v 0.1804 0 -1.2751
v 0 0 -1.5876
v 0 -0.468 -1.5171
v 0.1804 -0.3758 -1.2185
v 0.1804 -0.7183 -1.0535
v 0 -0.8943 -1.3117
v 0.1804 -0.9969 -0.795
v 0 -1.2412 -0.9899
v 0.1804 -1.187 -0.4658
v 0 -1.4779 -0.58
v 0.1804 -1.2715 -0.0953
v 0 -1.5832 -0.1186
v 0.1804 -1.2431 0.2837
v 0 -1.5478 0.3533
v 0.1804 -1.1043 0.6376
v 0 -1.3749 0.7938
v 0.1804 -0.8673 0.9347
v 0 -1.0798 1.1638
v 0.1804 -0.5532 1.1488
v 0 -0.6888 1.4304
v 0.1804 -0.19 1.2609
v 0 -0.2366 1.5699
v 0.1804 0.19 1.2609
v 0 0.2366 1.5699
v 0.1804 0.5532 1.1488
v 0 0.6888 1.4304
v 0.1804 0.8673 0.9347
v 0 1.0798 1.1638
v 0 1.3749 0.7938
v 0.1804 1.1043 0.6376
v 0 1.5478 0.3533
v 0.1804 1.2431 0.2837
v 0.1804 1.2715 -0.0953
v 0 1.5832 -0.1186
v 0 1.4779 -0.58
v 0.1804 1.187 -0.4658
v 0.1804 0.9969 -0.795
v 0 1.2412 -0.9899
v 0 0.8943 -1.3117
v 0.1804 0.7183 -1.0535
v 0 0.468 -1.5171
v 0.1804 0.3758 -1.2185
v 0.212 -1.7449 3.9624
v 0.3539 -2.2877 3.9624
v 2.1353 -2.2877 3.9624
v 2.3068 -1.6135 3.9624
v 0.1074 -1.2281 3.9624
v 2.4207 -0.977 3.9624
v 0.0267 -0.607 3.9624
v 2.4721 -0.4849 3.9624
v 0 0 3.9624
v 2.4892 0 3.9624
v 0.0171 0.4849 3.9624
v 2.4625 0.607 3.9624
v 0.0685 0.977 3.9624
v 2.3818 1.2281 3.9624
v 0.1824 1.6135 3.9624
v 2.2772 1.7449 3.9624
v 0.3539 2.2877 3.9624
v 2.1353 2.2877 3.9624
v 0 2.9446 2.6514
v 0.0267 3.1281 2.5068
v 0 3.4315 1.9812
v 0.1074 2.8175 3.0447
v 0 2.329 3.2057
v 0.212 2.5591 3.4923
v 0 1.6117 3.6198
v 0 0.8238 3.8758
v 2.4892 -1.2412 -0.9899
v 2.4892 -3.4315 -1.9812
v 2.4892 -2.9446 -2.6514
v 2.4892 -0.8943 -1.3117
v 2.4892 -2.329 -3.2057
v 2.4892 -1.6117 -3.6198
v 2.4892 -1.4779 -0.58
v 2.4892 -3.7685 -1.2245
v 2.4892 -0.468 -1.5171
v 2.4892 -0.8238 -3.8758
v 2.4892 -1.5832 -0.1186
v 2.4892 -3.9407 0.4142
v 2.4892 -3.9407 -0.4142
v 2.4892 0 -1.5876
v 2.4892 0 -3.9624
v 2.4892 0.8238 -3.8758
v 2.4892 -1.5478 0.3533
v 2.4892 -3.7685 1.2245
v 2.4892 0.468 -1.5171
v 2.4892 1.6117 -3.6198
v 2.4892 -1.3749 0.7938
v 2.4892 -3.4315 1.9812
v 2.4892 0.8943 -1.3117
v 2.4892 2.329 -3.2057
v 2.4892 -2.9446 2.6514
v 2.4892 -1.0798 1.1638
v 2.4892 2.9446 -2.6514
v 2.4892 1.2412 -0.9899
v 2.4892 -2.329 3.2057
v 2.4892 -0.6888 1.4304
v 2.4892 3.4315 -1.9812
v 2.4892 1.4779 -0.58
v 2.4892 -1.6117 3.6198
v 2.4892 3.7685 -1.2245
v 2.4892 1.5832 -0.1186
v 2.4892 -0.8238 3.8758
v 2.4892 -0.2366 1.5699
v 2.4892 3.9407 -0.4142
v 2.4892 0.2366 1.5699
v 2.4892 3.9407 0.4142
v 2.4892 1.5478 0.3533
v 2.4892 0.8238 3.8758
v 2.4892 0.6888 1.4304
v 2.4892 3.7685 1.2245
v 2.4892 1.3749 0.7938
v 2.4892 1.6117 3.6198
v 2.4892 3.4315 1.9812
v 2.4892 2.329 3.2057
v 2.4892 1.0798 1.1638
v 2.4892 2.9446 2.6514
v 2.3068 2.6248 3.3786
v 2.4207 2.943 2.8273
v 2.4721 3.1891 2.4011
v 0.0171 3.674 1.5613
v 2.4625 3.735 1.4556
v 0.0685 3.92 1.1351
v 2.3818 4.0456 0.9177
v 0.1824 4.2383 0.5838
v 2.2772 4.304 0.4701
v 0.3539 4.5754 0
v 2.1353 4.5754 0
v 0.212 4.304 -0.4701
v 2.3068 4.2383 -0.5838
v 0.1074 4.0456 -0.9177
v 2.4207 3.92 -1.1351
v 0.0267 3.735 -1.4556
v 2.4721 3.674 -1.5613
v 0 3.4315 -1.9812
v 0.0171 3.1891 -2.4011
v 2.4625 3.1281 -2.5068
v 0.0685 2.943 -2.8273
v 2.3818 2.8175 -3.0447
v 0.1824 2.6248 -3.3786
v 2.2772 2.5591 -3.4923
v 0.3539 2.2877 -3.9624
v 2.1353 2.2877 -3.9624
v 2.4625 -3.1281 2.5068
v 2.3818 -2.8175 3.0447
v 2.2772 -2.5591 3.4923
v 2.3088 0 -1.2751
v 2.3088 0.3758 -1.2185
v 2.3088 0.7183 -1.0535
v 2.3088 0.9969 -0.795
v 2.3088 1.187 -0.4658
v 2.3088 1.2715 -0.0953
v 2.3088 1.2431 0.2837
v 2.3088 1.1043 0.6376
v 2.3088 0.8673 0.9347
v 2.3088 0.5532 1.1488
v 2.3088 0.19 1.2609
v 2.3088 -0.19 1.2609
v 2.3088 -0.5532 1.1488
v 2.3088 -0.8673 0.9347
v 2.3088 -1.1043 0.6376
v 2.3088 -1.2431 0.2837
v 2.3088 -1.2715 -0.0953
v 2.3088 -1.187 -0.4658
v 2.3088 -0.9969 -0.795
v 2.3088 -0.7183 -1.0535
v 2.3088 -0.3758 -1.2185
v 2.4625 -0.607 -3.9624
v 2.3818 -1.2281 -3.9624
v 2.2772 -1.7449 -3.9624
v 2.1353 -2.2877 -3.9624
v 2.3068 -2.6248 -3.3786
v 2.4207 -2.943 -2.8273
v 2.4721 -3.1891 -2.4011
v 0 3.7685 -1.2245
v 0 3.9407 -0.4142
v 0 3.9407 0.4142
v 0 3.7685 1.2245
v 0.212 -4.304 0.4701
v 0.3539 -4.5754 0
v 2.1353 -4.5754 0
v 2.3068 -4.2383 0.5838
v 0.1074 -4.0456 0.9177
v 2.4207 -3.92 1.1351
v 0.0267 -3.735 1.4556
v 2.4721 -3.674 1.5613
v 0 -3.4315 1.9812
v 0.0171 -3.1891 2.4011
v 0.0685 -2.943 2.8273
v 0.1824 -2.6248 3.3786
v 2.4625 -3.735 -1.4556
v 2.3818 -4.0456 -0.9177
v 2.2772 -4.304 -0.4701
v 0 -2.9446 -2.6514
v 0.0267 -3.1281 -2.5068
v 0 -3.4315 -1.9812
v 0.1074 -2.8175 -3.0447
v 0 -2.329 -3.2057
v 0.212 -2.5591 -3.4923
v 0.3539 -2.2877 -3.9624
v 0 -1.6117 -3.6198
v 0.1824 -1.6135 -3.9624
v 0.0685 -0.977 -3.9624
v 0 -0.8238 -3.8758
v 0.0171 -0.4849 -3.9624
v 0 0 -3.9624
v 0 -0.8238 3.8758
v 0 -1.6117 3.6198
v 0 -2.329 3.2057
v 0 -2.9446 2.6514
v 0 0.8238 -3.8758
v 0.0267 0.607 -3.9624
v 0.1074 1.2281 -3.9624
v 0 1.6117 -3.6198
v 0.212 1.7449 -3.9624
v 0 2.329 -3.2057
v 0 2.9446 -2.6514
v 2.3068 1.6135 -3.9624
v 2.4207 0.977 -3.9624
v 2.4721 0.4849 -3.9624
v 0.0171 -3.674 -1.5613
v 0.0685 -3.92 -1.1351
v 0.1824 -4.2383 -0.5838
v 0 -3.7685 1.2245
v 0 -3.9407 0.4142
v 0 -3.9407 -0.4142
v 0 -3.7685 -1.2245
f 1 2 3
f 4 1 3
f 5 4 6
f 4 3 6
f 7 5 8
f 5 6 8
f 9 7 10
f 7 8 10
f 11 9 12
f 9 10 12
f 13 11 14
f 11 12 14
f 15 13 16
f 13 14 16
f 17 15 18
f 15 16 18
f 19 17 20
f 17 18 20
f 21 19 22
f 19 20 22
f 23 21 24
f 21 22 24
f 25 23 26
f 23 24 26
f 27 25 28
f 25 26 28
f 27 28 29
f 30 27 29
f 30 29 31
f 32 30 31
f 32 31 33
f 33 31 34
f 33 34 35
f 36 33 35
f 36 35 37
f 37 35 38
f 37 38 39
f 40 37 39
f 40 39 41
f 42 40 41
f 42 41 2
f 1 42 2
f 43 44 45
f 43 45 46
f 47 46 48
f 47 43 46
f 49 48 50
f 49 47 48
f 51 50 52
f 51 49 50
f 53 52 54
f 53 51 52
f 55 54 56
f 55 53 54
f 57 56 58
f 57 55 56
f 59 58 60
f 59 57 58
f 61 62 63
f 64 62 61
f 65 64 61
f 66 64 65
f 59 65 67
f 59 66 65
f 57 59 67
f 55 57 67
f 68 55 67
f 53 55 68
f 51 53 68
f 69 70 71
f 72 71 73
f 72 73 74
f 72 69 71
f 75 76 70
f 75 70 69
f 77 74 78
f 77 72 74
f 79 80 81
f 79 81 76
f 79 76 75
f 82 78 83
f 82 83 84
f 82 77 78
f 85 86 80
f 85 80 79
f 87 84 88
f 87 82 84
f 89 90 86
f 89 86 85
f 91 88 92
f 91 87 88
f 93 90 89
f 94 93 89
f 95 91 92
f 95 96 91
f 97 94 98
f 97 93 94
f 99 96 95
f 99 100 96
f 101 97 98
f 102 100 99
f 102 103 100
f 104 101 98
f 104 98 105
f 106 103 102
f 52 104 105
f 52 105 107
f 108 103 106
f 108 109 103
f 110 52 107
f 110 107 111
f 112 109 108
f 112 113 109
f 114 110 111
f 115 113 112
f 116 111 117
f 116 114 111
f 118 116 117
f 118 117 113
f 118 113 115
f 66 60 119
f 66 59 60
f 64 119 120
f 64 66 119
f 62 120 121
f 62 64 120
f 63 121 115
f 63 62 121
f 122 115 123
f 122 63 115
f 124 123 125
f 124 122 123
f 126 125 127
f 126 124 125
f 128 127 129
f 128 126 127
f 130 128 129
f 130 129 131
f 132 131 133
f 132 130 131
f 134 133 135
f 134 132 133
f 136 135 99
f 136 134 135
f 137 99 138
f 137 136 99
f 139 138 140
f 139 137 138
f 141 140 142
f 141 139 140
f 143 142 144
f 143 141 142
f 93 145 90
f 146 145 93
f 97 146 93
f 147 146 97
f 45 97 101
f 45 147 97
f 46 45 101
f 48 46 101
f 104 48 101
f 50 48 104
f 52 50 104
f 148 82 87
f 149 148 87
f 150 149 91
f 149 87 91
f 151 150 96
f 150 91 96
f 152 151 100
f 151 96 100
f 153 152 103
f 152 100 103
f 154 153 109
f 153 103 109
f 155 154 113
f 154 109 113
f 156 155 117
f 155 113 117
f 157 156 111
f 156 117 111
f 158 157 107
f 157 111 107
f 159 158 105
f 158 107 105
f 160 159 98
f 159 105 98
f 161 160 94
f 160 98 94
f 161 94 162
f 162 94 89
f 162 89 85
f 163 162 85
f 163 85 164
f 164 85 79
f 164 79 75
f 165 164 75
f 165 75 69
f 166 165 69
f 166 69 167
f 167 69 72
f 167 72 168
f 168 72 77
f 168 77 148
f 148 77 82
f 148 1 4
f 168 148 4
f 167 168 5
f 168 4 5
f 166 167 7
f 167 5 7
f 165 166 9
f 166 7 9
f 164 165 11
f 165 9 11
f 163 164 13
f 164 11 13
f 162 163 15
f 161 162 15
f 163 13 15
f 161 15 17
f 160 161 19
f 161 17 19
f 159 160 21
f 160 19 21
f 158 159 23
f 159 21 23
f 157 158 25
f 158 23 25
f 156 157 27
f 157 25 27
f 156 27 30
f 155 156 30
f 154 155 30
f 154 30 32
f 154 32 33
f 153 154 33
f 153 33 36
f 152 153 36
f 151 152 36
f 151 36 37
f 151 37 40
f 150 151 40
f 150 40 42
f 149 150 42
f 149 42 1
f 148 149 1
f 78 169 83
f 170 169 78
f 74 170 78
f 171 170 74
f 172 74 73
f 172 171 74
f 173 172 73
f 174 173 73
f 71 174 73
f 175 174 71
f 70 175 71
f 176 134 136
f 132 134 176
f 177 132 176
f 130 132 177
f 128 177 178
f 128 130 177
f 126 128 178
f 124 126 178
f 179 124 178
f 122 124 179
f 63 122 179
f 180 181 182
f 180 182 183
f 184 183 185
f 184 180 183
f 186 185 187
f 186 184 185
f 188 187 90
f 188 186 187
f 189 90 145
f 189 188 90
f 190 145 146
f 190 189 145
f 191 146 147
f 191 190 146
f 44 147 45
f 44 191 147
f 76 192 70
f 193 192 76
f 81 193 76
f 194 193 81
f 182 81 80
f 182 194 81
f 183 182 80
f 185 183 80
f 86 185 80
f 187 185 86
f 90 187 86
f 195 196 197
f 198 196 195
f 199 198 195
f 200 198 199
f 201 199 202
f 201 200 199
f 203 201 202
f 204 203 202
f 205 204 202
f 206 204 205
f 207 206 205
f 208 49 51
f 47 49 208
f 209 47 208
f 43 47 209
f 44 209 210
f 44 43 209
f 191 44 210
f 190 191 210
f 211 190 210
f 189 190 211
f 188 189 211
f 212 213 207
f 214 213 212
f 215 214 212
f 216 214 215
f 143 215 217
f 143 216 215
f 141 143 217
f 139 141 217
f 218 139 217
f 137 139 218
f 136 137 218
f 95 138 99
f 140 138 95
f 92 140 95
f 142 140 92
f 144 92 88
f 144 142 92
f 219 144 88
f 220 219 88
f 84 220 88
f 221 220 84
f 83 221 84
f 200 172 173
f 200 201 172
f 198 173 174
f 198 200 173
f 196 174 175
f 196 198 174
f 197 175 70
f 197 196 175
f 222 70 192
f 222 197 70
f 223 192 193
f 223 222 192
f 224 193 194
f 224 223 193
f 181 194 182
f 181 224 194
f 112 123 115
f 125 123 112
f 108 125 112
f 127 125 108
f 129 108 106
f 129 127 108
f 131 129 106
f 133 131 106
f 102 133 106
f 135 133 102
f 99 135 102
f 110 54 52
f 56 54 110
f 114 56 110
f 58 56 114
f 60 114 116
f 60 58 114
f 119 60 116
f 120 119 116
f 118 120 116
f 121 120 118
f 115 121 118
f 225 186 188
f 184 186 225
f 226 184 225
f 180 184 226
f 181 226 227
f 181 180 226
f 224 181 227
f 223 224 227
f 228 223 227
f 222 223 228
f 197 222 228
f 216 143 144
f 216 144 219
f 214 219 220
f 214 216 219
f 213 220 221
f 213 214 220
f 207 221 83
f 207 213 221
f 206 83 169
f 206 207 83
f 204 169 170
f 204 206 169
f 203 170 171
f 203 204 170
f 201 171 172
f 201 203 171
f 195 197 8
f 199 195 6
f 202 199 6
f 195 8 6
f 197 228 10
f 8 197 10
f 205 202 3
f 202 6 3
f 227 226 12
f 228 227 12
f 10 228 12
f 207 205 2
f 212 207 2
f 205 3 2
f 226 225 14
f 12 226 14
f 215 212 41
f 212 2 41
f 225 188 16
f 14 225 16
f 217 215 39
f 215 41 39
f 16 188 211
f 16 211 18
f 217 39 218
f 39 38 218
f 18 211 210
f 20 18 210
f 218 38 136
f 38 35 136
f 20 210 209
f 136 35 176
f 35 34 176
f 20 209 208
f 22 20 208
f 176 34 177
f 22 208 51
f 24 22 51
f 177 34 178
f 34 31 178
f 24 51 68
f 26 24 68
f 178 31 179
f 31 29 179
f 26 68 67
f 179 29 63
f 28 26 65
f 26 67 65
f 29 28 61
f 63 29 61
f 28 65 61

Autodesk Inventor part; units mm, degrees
ref_plane "YZ Plane" through (0, 0, 0) normal (1, 0, 0) x (0, 1, 0)
ref_plane "XZ Plane" through (0, 0, 0) normal (0, 1, 0) x (-1, 0, 0)
sketch "Sketch1" plane through (0, 0, 0) normal (1, 0, 0) x (0, 1, 0)
  line L0 (-4.5754, 0) -> (-2.2877, 3.9624)
  line L1 (-2.2877, 3.9624) -> (2.2877, 3.9624)
  line L2 (2.2877, 3.9624) -> (4.5754, 0)
  line L3 (4.5754, 0) -> (2.2877, -3.9624)
  line L4 (2.2877, -3.9624) -> (-2.2877, -3.9624)
  line L5 (-2.2877, -3.9624) -> (-4.5754, 0)
  point P0 (0, 0)
  point P1 (0, 0)
  dimension "d0" = 9.1508
extrude "Body" add sketch "Sketch1" along normal blind 2.4892
sketch "Sketch2" plane through (0, 0, 0) normal (0, 0, 1) x (1, 0, 0)
  line L0 (0, 2.2877) -> (0, 4.5754) projected
  line L1 (0, 4.5754) -> (2.4892, 4.5754) projected
  line L2 (2.4892, 2.2877) -> (2.4892, 4.5754) projected
  line L3 (-0.4978, 0) -> (2.987, 0) projected
  line L4 (0.3539, 4.5754) -> (0, 3.9624)
  line L5 (2.1353, 4.5754) -> (2.4892, 3.9624)
  dimension "d3" = 30
  dimension "d4" = 30
  dimension "d5" = 7.9248
  dimension "d6" = 7.9248
revolve "Chamfer1" cut sketch "Sketch2" angle 360 about axis through (-10, 0, 0) along (1, 0, 0)
sketch "Sketch3" plane through (2.4892, 0, 0) normal (1, 0, 0) x (0, 0, -1)
  arc A0 (-1.9812, -3.4315) -> (1.9812, -3.4315) centre (0, 0) ccw projected
hole "Thread" at (2.4892, 0, 0) direction (-1, 0, 0) diameter 2.5502 end through all thread size "5-44 UNF" class "2B" standard "ANSI Unified Screw Threads"
chamfer "Chamfer2" distance 0.3125 angle 30 1 edges at (2.4892, 0, 1.2751) measured on face at (2.4892, 3.0491, -0.0512)
chamfer "Chamfer3" distance 0.3125 angle 30 1 edges at (0, 0, 1.2751) measured on face at (0, -3.0491, -0.0512)
ref_plane "Work Plane1" through (-9.8694, 0, 0) normal (0, -0.866, -0.5) x (1, 0, 0)
equation "\"d0\" = 1.1547 * SW"
equation "\"d1\" = KOH"
equation "\"d3\" = ANG1"
equation "\"d4\" = ANG2"
equation "\"d5\" = SW0"
equation "\"d6\" = SW01"
equation "\"d8\" = -0.5 * GD1 + 0.5 * NND"
equation "\"d40\" = -0.5 * GD1 + 0.5 * NND"
equation "\"d10\" = -0.5 * GD1 + 0.5 * NND"
equation "\"d41\" = -0.5 * GD1 + 0.5 * NND"
equation "\"ANG1\" = 30deg"
equation "\"ANG2\" = 30deg"
equation "\"NND\" = 3.175"
equation "\"KOH\" = 2.4892"
equation "\"SW\" = 7.9248"
equation "\"SW0\" = SW"
equation "\"SW01\" = SW"
equation "\"THREADDIA\" = 3.175"
equation "\"TOA\" = 30deg"
equation "\"E0\" = 1.155 * SW"
equation "\"GD1\" = 2.550084"
properties part number "ANSI B18.6.3 - 5 - 44" material "Steel, Mild"
